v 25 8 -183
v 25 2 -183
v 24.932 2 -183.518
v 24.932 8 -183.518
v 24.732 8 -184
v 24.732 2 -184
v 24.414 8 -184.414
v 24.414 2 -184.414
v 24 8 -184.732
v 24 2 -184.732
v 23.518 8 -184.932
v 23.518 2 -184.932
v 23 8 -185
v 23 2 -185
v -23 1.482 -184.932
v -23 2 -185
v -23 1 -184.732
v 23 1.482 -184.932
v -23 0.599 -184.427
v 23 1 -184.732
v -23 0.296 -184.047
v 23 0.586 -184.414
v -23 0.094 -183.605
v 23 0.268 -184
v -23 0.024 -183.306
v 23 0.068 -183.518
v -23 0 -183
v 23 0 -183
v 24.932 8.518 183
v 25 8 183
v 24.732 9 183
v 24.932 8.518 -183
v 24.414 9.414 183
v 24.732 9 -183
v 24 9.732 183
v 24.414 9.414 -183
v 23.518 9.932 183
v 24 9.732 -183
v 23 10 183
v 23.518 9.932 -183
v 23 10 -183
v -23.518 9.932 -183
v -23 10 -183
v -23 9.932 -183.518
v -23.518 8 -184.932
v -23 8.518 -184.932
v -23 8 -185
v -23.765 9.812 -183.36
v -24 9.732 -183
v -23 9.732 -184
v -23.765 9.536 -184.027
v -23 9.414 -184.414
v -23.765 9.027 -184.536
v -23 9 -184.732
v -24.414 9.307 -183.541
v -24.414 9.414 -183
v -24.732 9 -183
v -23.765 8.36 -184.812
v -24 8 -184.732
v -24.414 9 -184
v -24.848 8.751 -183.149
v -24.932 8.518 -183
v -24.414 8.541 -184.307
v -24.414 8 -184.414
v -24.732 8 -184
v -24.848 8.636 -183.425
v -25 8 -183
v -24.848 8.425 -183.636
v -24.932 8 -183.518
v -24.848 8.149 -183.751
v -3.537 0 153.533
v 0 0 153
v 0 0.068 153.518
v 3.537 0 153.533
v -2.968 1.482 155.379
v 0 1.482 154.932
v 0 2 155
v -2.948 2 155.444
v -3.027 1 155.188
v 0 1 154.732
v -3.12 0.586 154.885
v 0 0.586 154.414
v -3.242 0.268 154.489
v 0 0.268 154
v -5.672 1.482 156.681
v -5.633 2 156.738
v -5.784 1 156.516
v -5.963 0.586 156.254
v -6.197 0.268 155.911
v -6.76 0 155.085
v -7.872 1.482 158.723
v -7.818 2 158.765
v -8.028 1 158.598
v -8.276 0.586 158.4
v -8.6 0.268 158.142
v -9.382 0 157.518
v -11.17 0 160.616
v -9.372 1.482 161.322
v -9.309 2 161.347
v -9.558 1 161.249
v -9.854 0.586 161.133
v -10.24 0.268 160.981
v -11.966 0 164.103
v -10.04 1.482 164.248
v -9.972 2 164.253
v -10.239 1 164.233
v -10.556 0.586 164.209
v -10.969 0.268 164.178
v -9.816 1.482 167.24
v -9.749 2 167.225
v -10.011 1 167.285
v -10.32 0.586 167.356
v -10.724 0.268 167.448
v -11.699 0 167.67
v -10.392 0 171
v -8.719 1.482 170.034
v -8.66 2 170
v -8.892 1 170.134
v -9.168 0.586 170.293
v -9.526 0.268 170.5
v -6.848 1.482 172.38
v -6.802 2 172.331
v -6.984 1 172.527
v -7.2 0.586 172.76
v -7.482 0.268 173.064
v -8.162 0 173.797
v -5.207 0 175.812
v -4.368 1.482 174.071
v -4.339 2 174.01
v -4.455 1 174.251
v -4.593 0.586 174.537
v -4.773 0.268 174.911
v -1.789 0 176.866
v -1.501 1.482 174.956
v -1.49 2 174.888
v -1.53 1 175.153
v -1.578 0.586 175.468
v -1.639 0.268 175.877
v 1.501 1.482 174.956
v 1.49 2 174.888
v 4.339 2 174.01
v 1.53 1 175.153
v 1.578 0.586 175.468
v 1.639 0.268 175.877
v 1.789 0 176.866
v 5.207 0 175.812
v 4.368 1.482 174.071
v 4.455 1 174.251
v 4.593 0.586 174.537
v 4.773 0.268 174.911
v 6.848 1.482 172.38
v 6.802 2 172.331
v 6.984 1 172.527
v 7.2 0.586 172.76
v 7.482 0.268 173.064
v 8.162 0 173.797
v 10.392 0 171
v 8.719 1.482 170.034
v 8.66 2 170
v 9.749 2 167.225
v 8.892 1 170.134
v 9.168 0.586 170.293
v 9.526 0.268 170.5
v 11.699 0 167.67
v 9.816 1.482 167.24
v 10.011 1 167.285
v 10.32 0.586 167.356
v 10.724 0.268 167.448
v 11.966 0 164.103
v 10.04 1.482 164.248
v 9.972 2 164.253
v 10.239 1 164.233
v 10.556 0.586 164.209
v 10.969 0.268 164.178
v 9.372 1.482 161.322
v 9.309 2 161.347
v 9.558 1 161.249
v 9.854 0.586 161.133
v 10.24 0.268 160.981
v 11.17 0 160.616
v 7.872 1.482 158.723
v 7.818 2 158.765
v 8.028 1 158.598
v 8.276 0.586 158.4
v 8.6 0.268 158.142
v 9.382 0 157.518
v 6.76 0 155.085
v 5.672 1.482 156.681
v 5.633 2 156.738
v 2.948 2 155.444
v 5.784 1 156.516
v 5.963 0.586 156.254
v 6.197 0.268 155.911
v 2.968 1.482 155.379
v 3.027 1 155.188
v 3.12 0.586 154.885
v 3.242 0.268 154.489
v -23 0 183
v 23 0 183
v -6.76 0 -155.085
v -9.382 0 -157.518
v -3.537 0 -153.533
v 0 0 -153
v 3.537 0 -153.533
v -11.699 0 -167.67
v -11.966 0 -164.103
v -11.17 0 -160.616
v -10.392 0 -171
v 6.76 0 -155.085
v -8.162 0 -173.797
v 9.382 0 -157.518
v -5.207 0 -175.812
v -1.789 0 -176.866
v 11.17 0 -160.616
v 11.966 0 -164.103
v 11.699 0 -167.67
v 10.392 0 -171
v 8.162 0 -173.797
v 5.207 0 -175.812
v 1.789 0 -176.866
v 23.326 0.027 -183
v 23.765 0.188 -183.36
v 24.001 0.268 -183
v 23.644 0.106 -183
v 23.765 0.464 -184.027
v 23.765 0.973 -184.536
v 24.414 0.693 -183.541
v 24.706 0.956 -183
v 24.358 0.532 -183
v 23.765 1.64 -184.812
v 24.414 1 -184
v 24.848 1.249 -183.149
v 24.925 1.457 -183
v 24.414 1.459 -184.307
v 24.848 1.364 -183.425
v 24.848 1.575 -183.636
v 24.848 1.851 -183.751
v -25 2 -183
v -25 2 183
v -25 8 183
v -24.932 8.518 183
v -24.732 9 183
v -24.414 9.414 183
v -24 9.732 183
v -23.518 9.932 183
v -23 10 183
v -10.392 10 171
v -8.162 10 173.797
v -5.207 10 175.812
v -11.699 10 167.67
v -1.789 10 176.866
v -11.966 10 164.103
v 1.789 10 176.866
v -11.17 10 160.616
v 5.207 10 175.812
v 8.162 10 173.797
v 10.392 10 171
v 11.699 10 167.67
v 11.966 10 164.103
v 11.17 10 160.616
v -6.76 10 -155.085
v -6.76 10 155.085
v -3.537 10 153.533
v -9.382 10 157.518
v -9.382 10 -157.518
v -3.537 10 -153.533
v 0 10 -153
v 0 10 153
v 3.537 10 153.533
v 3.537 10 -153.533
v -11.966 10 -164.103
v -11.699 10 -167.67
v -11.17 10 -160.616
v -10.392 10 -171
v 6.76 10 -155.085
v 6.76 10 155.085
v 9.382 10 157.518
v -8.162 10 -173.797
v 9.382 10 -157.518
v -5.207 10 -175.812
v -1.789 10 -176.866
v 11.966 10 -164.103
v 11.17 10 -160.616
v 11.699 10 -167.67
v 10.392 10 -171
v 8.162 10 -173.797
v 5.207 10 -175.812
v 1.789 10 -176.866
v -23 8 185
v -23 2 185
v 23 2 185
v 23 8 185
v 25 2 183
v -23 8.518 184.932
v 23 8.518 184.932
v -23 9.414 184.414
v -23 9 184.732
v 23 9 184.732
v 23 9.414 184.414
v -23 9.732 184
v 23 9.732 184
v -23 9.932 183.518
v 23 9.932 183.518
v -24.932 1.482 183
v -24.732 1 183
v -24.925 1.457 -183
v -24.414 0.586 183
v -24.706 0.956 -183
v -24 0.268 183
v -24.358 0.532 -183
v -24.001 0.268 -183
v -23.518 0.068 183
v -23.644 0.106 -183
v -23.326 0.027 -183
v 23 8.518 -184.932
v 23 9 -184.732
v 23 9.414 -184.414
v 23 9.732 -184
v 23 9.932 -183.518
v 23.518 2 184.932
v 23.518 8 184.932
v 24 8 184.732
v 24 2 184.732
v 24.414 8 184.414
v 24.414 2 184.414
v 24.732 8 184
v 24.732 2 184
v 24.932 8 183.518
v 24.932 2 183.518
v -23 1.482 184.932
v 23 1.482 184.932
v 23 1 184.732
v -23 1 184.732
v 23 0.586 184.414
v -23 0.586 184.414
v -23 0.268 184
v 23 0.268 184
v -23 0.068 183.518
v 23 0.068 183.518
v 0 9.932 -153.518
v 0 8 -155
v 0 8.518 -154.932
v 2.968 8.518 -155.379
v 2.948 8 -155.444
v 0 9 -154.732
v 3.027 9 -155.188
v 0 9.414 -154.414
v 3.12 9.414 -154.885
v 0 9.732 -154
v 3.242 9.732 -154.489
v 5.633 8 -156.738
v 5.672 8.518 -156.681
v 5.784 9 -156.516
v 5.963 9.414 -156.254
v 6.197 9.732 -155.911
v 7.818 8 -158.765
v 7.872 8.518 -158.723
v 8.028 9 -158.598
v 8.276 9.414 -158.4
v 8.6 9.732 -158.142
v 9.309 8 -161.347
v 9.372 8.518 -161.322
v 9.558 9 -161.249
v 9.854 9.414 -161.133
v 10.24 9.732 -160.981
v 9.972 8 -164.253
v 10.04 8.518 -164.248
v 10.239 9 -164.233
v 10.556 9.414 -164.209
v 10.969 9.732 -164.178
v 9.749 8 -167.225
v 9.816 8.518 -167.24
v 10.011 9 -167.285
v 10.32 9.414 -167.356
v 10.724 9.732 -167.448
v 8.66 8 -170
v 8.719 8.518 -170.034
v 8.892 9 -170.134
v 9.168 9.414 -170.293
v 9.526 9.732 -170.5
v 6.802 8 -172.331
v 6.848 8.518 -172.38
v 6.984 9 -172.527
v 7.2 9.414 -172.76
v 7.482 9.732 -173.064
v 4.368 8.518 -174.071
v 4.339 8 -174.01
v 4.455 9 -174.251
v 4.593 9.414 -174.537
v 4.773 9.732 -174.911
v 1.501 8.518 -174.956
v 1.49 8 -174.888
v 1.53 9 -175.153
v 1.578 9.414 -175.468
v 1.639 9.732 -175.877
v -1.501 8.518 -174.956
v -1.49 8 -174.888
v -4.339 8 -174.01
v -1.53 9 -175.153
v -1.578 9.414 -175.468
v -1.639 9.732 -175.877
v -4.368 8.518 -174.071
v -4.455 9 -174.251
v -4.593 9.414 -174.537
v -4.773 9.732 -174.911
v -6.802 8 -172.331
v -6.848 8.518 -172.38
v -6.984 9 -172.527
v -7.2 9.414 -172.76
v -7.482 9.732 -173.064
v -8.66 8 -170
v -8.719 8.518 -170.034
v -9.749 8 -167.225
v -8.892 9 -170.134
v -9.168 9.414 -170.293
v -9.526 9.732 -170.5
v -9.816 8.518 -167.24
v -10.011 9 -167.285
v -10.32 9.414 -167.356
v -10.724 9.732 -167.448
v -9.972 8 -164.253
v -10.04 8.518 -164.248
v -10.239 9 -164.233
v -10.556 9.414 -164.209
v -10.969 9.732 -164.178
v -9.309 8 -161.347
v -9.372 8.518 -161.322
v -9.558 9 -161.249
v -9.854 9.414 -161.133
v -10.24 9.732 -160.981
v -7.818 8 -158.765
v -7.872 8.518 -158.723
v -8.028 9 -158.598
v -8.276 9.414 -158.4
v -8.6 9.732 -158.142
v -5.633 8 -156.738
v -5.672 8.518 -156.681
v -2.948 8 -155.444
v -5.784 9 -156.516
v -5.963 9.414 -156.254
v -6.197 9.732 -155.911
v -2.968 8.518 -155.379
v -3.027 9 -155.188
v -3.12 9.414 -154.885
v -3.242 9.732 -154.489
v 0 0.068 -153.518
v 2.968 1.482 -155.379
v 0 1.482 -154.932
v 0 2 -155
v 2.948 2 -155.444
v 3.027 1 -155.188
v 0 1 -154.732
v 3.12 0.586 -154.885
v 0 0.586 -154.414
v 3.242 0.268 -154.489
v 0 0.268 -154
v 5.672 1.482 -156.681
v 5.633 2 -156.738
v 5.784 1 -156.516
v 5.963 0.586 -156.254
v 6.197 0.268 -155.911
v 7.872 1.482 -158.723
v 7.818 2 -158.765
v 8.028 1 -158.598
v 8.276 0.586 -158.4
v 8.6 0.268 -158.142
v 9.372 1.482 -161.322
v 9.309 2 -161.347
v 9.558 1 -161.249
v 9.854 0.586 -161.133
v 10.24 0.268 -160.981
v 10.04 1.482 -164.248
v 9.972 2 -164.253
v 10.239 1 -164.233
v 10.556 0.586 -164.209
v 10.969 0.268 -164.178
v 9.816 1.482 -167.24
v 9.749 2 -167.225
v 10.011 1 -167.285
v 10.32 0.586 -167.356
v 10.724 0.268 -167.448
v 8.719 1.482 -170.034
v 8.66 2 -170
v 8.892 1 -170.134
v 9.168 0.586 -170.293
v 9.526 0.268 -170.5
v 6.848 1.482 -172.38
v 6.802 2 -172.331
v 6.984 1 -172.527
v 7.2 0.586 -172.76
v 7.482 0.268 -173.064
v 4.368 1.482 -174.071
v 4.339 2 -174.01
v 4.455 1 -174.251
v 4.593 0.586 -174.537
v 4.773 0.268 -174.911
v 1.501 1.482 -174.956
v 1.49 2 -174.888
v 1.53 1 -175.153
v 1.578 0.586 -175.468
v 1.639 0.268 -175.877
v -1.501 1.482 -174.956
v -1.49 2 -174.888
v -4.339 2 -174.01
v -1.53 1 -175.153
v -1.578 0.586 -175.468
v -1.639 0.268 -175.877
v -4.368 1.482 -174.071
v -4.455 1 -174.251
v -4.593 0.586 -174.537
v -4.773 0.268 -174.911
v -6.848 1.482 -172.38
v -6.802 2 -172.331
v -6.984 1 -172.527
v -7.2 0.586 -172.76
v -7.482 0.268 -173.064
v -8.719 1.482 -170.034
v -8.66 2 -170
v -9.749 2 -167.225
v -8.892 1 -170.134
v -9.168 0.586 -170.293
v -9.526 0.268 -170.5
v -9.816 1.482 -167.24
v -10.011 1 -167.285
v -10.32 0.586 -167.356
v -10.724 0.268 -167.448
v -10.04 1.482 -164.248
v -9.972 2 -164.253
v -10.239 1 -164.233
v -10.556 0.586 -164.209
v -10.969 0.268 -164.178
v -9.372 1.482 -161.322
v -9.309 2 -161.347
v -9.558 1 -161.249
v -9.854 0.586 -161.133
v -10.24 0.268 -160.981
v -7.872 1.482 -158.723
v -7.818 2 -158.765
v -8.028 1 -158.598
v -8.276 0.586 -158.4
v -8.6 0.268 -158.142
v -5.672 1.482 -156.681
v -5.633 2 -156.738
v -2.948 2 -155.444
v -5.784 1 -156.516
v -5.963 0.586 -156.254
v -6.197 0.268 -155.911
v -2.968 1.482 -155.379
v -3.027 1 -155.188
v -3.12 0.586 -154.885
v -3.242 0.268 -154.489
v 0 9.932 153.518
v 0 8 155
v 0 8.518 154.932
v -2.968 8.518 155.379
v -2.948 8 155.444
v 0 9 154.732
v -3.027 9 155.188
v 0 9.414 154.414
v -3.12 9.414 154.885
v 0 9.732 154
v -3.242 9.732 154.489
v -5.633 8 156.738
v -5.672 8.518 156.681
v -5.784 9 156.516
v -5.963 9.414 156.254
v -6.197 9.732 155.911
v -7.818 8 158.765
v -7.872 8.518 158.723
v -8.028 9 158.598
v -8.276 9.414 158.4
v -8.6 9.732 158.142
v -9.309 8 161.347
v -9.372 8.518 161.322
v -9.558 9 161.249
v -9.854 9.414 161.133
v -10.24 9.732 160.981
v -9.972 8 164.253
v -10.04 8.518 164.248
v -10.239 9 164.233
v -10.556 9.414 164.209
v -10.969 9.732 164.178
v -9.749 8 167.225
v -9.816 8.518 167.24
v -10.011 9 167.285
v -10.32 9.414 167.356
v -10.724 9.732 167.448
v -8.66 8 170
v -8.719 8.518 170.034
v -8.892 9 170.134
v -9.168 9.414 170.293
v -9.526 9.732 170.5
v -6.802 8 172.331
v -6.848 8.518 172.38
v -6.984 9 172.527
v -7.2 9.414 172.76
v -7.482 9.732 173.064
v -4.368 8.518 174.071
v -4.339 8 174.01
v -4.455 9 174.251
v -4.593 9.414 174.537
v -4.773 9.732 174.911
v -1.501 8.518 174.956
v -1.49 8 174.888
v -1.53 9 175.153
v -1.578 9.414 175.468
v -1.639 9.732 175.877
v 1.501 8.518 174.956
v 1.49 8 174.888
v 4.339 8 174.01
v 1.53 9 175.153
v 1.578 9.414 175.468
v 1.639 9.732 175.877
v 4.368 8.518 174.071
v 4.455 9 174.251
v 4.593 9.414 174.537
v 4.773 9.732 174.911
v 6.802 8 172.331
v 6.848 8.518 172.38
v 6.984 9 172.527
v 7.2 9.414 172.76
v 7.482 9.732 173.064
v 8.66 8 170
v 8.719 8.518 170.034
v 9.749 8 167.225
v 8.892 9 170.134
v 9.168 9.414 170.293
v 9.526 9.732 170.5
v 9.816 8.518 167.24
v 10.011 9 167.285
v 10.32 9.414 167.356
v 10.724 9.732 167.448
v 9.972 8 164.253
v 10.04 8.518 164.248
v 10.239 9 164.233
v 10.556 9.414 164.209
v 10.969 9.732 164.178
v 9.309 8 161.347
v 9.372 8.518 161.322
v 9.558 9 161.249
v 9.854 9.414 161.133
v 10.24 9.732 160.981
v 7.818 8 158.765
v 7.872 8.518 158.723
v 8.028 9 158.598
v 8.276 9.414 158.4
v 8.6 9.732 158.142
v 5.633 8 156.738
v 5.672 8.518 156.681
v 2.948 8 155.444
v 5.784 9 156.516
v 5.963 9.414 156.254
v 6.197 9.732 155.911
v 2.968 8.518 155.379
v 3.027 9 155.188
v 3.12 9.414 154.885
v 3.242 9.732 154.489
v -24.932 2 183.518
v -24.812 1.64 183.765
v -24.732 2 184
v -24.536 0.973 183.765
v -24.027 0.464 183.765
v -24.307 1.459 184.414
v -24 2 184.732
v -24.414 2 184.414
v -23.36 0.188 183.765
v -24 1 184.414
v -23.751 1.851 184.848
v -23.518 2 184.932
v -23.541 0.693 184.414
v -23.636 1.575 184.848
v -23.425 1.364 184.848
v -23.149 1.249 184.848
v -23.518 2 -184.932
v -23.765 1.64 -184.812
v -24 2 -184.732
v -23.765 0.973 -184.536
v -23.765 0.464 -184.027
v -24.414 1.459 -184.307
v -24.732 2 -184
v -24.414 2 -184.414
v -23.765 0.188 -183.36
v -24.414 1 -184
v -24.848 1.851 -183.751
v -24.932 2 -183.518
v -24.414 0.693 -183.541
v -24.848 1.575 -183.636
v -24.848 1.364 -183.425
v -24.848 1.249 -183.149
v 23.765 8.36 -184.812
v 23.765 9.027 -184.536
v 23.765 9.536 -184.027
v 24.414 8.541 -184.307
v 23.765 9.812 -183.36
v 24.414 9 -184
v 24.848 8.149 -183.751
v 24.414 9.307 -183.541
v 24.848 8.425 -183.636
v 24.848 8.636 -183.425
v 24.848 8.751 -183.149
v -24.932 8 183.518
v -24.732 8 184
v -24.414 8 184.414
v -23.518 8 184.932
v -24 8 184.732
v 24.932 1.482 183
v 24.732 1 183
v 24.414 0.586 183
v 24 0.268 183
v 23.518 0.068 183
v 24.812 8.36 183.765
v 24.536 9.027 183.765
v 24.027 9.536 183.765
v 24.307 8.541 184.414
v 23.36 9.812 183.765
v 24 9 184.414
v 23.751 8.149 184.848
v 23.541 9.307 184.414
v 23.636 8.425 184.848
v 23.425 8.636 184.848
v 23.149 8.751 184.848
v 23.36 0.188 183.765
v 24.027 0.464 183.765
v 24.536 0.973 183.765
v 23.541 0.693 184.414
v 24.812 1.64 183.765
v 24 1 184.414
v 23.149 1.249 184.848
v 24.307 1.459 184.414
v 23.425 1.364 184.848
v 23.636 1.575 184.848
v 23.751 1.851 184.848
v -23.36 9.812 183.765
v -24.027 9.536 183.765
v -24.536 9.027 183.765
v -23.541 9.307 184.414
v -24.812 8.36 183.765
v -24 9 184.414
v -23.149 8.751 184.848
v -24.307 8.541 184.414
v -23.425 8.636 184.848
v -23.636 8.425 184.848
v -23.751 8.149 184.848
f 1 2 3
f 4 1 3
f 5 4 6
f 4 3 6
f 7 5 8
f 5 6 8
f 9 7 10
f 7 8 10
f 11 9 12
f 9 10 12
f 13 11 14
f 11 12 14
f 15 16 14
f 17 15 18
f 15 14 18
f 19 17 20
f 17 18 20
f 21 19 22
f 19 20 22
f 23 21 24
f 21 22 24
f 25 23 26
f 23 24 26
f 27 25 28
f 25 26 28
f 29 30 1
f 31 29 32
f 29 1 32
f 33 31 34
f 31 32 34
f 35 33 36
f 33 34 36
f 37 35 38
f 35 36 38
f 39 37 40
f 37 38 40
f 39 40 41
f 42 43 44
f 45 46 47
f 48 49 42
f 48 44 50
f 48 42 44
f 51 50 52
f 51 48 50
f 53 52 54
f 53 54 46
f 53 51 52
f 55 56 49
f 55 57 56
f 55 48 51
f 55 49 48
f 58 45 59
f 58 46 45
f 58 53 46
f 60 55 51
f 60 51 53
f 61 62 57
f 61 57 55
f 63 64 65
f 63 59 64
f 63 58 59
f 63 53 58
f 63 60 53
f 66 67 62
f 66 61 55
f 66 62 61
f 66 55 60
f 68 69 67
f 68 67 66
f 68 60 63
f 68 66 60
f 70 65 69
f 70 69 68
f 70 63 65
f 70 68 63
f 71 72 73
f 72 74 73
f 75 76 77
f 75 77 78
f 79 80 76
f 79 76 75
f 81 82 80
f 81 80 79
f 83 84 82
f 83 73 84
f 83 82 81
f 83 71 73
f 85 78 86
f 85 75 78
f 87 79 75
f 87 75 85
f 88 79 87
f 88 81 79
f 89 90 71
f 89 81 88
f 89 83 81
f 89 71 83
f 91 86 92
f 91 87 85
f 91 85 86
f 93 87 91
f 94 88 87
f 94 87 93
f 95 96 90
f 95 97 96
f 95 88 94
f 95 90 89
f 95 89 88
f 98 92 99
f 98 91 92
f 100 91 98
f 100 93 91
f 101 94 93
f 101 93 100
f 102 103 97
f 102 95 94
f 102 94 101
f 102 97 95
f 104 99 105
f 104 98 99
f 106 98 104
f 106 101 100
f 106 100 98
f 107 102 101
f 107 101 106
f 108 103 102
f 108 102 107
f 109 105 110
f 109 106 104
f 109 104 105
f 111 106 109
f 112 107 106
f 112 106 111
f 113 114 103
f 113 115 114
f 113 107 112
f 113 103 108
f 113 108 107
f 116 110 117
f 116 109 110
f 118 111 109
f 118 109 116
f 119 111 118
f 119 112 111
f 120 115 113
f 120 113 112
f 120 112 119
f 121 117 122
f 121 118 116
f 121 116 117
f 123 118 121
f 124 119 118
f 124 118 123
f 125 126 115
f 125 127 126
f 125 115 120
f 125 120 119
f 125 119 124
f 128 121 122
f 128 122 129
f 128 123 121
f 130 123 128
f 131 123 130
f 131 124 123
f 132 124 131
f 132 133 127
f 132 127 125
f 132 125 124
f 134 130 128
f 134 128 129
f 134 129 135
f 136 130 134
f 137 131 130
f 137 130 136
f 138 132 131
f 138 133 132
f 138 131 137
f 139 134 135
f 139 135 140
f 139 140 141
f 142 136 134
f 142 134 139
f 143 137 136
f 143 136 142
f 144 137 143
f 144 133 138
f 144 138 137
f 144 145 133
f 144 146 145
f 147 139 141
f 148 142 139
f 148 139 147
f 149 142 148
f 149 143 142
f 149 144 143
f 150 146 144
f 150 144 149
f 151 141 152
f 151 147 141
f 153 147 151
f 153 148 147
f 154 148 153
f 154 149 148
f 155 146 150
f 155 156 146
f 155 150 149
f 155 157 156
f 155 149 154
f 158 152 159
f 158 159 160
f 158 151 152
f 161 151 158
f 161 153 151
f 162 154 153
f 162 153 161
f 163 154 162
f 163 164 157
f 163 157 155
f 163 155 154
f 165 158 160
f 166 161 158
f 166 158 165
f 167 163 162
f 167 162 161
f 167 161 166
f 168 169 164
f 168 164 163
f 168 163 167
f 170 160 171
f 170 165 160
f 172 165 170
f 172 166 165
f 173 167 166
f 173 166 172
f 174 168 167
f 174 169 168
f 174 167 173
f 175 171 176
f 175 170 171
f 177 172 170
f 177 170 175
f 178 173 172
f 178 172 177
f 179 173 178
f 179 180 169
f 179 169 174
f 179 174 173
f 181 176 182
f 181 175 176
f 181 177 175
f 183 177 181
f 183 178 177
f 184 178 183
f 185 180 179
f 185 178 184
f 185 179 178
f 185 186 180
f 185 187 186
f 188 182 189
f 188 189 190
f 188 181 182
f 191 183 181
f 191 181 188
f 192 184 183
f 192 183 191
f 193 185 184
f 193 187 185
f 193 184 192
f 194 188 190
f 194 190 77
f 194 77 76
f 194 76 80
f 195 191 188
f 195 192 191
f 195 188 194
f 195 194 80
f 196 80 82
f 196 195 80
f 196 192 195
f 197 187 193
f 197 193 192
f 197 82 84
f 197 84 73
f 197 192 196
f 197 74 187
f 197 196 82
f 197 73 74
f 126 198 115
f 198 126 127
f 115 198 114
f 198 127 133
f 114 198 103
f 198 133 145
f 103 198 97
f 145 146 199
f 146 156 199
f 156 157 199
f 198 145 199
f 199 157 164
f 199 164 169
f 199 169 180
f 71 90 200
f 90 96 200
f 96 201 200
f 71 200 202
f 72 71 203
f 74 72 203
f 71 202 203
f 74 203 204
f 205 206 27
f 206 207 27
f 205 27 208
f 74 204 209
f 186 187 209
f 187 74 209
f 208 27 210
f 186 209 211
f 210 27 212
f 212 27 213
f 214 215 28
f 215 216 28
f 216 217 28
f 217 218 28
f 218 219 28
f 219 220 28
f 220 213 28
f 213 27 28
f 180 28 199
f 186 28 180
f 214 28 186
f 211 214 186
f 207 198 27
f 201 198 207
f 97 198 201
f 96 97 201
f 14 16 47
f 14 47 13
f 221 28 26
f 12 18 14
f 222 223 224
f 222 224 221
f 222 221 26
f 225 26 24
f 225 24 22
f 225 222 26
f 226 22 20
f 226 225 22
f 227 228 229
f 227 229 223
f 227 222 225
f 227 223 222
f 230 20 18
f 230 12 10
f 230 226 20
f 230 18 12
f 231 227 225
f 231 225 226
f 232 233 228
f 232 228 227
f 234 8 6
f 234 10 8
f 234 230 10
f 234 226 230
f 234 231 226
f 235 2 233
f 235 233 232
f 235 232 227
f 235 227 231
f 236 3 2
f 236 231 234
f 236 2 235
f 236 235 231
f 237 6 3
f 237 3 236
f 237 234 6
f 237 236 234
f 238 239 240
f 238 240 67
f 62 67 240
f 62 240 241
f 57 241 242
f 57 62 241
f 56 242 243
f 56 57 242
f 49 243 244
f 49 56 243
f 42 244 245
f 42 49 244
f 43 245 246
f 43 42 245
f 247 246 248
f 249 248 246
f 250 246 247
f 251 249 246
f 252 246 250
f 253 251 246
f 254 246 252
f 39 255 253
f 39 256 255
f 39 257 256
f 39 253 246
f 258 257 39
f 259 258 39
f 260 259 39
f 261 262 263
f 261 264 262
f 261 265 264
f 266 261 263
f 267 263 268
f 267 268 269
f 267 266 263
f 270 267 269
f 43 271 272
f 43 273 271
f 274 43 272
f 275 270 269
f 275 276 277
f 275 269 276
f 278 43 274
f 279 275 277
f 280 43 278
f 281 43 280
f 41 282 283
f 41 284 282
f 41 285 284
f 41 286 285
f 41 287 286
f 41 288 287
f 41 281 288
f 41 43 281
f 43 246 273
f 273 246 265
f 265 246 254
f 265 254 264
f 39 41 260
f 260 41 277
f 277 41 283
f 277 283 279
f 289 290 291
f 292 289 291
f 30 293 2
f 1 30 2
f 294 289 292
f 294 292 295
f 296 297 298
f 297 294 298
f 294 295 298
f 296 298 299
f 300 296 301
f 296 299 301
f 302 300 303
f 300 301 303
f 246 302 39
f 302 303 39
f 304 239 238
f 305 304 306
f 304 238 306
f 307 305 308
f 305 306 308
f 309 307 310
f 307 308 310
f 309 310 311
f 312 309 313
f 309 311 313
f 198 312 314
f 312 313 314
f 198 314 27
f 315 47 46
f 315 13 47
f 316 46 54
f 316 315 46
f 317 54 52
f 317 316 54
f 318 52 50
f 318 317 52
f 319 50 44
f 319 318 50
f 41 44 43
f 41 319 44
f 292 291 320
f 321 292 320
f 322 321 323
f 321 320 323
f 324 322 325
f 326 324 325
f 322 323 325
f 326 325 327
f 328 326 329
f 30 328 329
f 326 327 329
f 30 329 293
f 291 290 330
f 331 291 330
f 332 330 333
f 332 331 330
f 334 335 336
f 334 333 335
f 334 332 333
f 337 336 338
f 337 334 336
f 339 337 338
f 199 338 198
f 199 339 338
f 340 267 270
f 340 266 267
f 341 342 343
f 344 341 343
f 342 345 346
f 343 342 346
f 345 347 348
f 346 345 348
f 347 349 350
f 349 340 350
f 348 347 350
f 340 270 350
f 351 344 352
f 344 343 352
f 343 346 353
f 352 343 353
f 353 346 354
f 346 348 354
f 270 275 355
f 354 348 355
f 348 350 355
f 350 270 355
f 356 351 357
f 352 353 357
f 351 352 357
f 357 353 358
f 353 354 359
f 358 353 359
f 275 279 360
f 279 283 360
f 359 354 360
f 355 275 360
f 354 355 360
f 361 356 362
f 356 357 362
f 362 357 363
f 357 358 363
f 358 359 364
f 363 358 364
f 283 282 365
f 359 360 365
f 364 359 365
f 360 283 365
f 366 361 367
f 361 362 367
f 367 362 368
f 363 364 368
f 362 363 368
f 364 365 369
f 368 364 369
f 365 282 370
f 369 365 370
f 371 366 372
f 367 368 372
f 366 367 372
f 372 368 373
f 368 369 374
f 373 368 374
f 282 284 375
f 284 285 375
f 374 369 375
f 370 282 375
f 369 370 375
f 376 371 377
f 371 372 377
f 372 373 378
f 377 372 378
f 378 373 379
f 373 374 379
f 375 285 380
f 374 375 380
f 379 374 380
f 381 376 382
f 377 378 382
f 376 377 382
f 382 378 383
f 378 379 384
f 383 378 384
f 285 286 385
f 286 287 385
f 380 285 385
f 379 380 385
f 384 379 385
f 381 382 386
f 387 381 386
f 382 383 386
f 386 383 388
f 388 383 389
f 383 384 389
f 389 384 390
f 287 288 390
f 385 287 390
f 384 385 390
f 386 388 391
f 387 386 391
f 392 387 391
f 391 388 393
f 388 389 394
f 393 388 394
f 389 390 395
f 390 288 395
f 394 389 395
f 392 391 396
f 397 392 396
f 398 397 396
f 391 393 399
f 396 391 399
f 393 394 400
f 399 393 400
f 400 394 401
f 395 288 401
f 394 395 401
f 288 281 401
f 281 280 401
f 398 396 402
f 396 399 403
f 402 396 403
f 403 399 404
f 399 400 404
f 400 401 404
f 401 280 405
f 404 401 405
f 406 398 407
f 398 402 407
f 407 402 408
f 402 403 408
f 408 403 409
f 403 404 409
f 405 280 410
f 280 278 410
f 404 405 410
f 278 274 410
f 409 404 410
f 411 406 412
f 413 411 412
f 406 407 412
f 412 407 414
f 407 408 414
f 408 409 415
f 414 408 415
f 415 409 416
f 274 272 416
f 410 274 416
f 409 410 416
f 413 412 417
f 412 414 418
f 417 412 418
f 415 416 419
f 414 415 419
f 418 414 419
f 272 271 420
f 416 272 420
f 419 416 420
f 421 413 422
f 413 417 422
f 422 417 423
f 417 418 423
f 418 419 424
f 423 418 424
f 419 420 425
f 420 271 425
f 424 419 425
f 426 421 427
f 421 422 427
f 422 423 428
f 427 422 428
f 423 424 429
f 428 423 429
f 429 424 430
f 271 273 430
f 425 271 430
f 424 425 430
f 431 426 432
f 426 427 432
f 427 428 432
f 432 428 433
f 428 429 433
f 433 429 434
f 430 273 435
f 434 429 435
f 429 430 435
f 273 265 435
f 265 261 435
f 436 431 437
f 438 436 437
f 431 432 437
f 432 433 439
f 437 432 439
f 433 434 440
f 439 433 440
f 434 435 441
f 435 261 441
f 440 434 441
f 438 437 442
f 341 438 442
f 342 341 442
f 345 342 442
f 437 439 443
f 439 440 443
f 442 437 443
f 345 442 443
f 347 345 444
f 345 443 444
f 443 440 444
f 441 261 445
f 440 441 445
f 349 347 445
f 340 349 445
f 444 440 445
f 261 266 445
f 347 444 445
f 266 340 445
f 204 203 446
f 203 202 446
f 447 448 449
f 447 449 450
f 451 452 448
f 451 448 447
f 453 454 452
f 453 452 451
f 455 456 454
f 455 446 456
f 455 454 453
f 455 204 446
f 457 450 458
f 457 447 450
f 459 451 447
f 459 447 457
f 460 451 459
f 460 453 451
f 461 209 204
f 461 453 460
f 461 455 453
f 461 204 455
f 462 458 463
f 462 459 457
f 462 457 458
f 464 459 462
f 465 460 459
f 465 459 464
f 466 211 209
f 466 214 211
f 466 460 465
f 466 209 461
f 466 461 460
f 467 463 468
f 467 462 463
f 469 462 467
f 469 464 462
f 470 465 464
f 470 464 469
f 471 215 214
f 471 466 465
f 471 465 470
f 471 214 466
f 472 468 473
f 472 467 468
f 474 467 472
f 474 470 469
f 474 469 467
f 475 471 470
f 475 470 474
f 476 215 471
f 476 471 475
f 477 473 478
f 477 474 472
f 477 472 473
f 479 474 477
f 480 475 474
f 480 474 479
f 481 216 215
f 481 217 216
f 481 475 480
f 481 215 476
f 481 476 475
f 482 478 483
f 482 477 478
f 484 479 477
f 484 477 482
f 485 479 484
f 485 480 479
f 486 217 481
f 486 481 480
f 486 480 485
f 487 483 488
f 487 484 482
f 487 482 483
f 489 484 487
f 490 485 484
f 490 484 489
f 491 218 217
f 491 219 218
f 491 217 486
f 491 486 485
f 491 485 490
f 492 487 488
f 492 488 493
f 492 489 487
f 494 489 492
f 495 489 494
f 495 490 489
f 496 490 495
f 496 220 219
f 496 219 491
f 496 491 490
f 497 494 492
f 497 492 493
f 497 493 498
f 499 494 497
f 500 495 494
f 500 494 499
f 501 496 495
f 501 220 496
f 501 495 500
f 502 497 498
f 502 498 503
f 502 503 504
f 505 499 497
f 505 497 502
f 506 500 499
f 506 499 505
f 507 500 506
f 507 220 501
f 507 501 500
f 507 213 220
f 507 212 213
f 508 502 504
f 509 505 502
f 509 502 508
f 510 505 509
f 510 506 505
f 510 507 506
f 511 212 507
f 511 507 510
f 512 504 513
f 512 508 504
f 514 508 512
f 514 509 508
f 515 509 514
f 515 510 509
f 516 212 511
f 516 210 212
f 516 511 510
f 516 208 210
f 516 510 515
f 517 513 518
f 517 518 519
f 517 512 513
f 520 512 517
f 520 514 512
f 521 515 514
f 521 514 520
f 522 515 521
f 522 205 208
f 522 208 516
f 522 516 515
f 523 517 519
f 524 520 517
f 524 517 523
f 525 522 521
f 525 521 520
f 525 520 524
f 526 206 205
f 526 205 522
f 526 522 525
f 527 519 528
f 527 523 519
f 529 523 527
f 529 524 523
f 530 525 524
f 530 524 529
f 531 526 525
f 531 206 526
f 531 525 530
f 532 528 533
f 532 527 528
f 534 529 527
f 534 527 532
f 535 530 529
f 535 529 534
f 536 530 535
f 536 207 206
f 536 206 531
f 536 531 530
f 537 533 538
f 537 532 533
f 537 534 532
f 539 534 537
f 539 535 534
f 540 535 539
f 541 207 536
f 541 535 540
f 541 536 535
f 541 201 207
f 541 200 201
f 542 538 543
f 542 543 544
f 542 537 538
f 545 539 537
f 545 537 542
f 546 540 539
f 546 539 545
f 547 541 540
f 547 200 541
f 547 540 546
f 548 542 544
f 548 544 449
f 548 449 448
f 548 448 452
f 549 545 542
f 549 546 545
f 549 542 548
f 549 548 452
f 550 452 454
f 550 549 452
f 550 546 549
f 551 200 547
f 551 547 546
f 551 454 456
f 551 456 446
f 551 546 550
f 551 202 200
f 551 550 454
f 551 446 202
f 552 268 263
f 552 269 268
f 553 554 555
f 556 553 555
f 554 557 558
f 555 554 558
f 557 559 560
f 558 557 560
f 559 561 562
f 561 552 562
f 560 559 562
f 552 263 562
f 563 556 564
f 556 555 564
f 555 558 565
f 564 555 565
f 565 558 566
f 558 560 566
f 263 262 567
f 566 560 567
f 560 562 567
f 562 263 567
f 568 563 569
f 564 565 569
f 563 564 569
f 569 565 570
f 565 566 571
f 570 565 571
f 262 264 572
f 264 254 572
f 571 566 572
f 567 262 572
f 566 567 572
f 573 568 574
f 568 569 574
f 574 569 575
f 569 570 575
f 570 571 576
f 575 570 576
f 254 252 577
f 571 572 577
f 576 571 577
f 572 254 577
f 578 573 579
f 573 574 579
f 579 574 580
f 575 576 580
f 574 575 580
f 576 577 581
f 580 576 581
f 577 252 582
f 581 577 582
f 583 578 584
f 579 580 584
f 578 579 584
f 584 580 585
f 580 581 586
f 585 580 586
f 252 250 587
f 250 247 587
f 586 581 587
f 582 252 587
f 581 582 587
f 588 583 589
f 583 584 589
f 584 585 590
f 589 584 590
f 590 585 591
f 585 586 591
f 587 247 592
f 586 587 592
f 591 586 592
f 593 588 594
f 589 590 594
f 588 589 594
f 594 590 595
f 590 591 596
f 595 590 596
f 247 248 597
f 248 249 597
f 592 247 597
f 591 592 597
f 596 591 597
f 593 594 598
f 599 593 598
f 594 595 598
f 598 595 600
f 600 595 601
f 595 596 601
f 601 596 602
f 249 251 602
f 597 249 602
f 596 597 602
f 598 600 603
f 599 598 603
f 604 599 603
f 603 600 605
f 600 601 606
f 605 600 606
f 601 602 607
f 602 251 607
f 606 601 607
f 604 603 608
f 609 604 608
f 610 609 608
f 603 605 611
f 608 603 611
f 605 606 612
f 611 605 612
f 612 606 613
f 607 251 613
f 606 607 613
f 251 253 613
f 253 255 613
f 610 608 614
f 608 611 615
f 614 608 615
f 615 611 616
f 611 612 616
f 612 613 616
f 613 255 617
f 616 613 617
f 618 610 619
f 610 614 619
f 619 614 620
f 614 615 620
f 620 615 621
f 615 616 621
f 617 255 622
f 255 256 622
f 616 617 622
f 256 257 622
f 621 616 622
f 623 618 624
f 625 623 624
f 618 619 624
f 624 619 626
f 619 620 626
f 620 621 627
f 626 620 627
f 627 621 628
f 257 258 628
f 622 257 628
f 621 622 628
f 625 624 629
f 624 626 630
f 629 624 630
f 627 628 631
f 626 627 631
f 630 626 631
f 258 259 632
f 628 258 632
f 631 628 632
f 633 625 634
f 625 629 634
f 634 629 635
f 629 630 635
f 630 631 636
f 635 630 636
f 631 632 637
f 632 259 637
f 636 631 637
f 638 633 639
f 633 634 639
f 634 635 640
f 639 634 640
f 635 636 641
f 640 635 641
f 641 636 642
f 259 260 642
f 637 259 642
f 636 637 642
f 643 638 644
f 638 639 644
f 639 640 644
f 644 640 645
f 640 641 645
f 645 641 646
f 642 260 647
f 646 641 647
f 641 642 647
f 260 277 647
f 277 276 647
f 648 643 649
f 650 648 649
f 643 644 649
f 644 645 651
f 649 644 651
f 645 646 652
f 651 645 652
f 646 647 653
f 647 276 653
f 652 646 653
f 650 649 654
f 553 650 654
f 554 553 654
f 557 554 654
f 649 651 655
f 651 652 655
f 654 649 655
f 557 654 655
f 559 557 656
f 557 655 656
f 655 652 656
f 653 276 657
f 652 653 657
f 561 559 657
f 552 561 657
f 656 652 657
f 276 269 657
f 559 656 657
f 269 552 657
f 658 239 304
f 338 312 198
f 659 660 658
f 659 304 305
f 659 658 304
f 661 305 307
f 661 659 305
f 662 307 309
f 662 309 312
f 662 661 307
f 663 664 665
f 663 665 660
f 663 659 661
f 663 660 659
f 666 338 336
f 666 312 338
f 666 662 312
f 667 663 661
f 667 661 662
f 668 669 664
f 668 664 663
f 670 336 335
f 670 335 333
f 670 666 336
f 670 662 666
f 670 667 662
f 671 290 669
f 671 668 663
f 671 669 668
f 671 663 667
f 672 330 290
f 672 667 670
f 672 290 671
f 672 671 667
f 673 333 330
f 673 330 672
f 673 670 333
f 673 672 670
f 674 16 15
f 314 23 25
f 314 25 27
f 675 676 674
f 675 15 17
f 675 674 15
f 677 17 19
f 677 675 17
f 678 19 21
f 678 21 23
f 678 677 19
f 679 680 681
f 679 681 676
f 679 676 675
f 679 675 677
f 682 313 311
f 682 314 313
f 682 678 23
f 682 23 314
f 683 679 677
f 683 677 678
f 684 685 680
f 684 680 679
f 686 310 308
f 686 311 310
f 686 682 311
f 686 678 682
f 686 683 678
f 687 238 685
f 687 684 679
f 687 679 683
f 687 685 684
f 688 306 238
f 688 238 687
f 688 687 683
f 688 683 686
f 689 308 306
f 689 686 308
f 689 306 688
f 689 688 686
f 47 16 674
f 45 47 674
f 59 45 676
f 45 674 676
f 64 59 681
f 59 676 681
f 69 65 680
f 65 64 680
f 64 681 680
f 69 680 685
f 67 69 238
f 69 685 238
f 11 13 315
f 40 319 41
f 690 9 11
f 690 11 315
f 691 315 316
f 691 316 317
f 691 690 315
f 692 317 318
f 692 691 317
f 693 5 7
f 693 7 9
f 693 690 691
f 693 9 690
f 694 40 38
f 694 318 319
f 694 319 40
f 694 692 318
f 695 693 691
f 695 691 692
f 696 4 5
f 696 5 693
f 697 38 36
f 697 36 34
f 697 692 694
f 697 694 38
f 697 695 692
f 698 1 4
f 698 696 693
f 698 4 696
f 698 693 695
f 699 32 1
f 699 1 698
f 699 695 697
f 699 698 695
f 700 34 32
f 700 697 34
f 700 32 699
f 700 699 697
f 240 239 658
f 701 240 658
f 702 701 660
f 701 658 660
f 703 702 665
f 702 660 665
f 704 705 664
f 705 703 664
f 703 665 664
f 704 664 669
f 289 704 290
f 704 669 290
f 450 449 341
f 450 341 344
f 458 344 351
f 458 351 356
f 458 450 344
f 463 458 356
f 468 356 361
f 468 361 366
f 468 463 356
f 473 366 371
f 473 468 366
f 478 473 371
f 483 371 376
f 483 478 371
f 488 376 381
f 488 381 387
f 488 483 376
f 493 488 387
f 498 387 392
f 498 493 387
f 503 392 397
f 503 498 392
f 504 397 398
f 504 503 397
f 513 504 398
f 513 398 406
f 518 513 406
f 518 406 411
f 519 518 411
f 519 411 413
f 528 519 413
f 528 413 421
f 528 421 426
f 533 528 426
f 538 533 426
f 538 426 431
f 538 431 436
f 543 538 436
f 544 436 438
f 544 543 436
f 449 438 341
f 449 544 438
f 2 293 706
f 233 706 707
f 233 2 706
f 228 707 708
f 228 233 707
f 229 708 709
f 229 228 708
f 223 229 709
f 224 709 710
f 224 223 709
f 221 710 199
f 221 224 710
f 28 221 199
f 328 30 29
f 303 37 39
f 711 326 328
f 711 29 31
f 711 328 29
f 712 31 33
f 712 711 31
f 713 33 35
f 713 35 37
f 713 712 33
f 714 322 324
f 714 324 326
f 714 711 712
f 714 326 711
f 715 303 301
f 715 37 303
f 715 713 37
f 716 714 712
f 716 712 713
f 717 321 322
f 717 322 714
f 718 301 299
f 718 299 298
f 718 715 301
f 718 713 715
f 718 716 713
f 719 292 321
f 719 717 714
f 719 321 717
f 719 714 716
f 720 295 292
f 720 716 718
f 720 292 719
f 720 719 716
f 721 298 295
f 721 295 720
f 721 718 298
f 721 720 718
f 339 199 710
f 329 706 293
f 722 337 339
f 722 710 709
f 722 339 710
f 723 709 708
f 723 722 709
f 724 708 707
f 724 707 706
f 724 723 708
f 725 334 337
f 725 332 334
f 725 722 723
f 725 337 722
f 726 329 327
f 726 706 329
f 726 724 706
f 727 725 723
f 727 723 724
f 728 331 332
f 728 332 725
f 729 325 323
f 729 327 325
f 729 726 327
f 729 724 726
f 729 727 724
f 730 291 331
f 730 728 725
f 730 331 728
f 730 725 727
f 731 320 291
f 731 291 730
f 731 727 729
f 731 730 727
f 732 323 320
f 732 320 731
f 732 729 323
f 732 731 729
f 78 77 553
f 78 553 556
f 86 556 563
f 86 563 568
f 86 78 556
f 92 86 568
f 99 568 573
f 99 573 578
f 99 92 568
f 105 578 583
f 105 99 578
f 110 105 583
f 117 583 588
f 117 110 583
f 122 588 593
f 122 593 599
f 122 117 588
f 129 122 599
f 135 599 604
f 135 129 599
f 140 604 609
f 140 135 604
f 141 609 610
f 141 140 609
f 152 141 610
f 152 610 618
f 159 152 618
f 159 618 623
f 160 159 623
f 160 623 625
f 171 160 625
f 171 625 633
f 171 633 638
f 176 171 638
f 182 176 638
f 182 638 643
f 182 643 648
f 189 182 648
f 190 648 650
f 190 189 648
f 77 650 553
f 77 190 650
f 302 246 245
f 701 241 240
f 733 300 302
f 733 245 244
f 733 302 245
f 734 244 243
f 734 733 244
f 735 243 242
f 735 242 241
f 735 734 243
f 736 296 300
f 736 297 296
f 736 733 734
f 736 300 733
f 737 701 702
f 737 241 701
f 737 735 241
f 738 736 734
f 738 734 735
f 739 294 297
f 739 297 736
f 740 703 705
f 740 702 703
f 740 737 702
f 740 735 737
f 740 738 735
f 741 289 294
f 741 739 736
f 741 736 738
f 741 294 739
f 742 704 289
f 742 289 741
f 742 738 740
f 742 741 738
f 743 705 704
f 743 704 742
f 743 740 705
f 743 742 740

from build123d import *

# Parameters (mm, degrees)
CROQUIS1_W              = 50
CROQUIS1_H              = 370
CROQUIS1_R              = 10
SALIENTE_EXTRUIR1_DEPTH = 10
REDONDEO1_R             = 2
REDONDEO2_R             = 2


with BuildPart() as part:
    # Croquis1 → Saliente-Extruir1 (new body)
    with BuildSketch(Plane(origin=(0, 0, 0), x_dir=(1, 0, 0), z_dir=(0, 1, 0))):
        Rectangle(CROQUIS1_W, CROQUIS1_H)
        with Locations(Location((0, 165, 0), (0, 0, 270))):
            Circle(CROQUIS1_R, mode=Mode.SUBTRACT)
        with Locations(Location((0, -165, 0), (0, 0, 90))):
            Circle(CROQUIS1_R, mode=Mode.SUBTRACT)
    extrude(amount=SALIENTE_EXTRUIR1_DEPTH)

    # Redondeo1
    redondeo1_edges = [part.edges().sort_by_distance(p)[0] for p in [
        (0, 0, -175),
        (0, 10, -175),
        (-25, 10, 0),
        (0, 0, 175),
        (0, 10, 175),
        (0, 10, 185),
        (25, 10, 0),
        (0, 0, 185),
        (-25, 0, 0),
        (0, 0, -185),
        (25, 0, 0),
        (0, 10, -185),
    ]]
    fillet(redondeo1_edges, radius=REDONDEO1_R)

    # Redondeo2
    # the kernel refuses this fillet: 2 mm, written as the material it takes off along each edge
    with BuildSketch(Plane(origin=(-23, 8, -183), x_dir=(0, 0, -1), z_dir=(-1, 0, 0))) as redondeo2_piece_1_section:
        Polygon((0, 0), (REDONDEO2_R, 0), (REDONDEO2_R, -REDONDEO2_R), (0, -REDONDEO2_R), align=None)
    redondeo2_piece_1 = extrude(amount=REDONDEO2_R, mode=Mode.PRIVATE)
    redondeo2_piece_1 = redondeo2_piece_1 - Plane(origin=(-23, 8, -183), x_dir=(0, -0.7071067811865475, 0.7071067811865475), z_dir=(-1, 0, 0)) * Sphere(REDONDEO2_R, mode=Mode.PRIVATE)
    add(redondeo2_piece_1, mode=Mode.SUBTRACT)
    with BuildSketch(Plane(origin=(23, 8, -183), x_dir=(0, 0, -1), z_dir=(1, 0, 0))) as redondeo2_piece_2_section:
        Polygon((0, 0), (REDONDEO2_R, 0), (REDONDEO2_R, REDONDEO2_R), (0, REDONDEO2_R), align=None)
    redondeo2_piece_2 = extrude(amount=REDONDEO2_R, mode=Mode.PRIVATE)
    redondeo2_piece_2 = redondeo2_piece_2 - Plane(origin=(23, 8, -183), x_dir=(0, -0.7071067811865475, 0.7071067811865475), z_dir=(1, 0, 0)) * Sphere(REDONDEO2_R, mode=Mode.PRIVATE)
    add(redondeo2_piece_2, mode=Mode.SUBTRACT)
    with BuildSketch(Plane(origin=(-23, 8, 183), x_dir=(-1, 0, 0), z_dir=(0, 0, 1))) as redondeo2_piece_3_section:
        Polygon((0, 0), (REDONDEO2_R, 0), (REDONDEO2_R, -REDONDEO2_R), (0, -REDONDEO2_R), align=None)
    redondeo2_piece_3 = extrude(amount=REDONDEO2_R, mode=Mode.PRIVATE)
    redondeo2_piece_3 = redondeo2_piece_3 - Plane(origin=(-23, 8, 183), x_dir=(0.7071067811865475, -0.7071067811865475, 0), z_dir=(0, 0, 1)) * Sphere(REDONDEO2_R, mode=Mode.PRIVATE)
    add(redondeo2_piece_3, mode=Mode.SUBTRACT)
    with BuildSketch(Plane(origin=(23, 8, 183), x_dir=(1, 0, 0), z_dir=(0, 0, 1))) as redondeo2_piece_4_section:
        Polygon((0, 0), (REDONDEO2_R, 0), (REDONDEO2_R, REDONDEO2_R), (0, REDONDEO2_R), align=None)
    redondeo2_piece_4 = extrude(amount=REDONDEO2_R, mode=Mode.PRIVATE)
    redondeo2_piece_4 = redondeo2_piece_4 - Plane(origin=(23, 8, 183), x_dir=(-0.7071067811865475, -0.7071067811865475, 0), z_dir=(0, 0, 1)) * Sphere(REDONDEO2_R, mode=Mode.PRIVATE)
    add(redondeo2_piece_4, mode=Mode.SUBTRACT)
    with BuildSketch(Plane(origin=(23, 2, 183), x_dir=(1, 0, 0), z_dir=(0, 0, 1))) as redondeo2_piece_5_section:
        Polygon((0, 0), (REDONDEO2_R, 0), (REDONDEO2_R, -REDONDEO2_R), (0, -REDONDEO2_R), align=None)
    redondeo2_piece_5 = extrude(amount=REDONDEO2_R, mode=Mode.PRIVATE)
    redondeo2_piece_5 = redondeo2_piece_5 - Plane(origin=(23, 2, 183), x_dir=(-0.7071067811865475, 0.7071067811865475, 0), z_dir=(0, 0, 1)) * Sphere(REDONDEO2_R, mode=Mode.PRIVATE)
    add(redondeo2_piece_5, mode=Mode.SUBTRACT)
    with BuildSketch(Plane(origin=(-23, 2, 183), x_dir=(-1, 0, 0), z_dir=(0, 0, 1))) as redondeo2_piece_6_section:
        Polygon((0, 0), (REDONDEO2_R, 0), (REDONDEO2_R, REDONDEO2_R), (0, REDONDEO2_R), align=None)
    redondeo2_piece_6 = extrude(amount=REDONDEO2_R, mode=Mode.PRIVATE)
    redondeo2_piece_6 = redondeo2_piece_6 - Plane(origin=(-23, 2, 183), x_dir=(0.7071067811865475, 0.7071067811865475, 0), z_dir=(0, 0, 1)) * Sphere(REDONDEO2_R, mode=Mode.PRIVATE)
    add(redondeo2_piece_6, mode=Mode.SUBTRACT)
    with BuildSketch(Plane(origin=(23, 2, -183), x_dir=(0, 0, -1), z_dir=(1, 0, 0))) as redondeo2_piece_7_section:
        Polygon((0, 0), (REDONDEO2_R, 0), (REDONDEO2_R, -REDONDEO2_R), (0, -REDONDEO2_R), align=None)
    redondeo2_piece_7 = extrude(amount=REDONDEO2_R, mode=Mode.PRIVATE)
    redondeo2_piece_7 = redondeo2_piece_7 - Plane(origin=(23, 2, -183), x_dir=(0, 0.7071067811865475, 0.7071067811865475), z_dir=(1, 0, 0)) * Sphere(REDONDEO2_R, mode=Mode.PRIVATE)
    add(redondeo2_piece_7, mode=Mode.SUBTRACT)
    with BuildSketch(Plane(origin=(-23, 2, -183), x_dir=(0, 0, -1), z_dir=(-1, 0, 0))) as redondeo2_piece_8_section:
        Polygon((0, 0), (REDONDEO2_R, 0), (REDONDEO2_R, REDONDEO2_R), (0, REDONDEO2_R), align=None)
    redondeo2_piece_8 = extrude(amount=REDONDEO2_R, mode=Mode.PRIVATE)
    redondeo2_piece_8 = redondeo2_piece_8 - Plane(origin=(-23, 2, -183), x_dir=(0, 0.7071067811865475, 0.7071067811865475), z_dir=(-1, 0, 0)) * Sphere(REDONDEO2_R, mode=Mode.PRIVATE)
    add(redondeo2_piece_8, mode=Mode.SUBTRACT)
    with BuildSketch(Plane(origin=(25, 2, 185), x_dir=(-1, 0, 0), z_dir=(0, 1, 0)), Plane(origin=(25, 2, -185), x_dir=(0, 0, 1), z_dir=(0, 1, 0))) as redondeo2_piece_9:
        with BuildLine():
            CenterArc((REDONDEO2_R, -REDONDEO2_R), REDONDEO2_R, 90, 90)
            Line((0, -REDONDEO2_R), (0, 0))
            Line((0, 0), (REDONDEO2_R, 0))
        make_face()
    extrude(amount=6, mode=Mode.SUBTRACT)
    with BuildSketch(Plane(origin=(-25, 2, 185), x_dir=(1, 0, 0), z_dir=(0, 1, 0)), Plane(origin=(-25, 2, -185), x_dir=(0, 0, 1), z_dir=(0, 1, 0))) as redondeo2_piece_10:
        with BuildLine():
            CenterArc((REDONDEO2_R, REDONDEO2_R), REDONDEO2_R, 180, 90)
            Line((0, REDONDEO2_R), (0, 0))
            Line((0, 0), (REDONDEO2_R, 0))
        make_face()
    extrude(amount=6, mode=Mode.SUBTRACT)


solid = part.part
